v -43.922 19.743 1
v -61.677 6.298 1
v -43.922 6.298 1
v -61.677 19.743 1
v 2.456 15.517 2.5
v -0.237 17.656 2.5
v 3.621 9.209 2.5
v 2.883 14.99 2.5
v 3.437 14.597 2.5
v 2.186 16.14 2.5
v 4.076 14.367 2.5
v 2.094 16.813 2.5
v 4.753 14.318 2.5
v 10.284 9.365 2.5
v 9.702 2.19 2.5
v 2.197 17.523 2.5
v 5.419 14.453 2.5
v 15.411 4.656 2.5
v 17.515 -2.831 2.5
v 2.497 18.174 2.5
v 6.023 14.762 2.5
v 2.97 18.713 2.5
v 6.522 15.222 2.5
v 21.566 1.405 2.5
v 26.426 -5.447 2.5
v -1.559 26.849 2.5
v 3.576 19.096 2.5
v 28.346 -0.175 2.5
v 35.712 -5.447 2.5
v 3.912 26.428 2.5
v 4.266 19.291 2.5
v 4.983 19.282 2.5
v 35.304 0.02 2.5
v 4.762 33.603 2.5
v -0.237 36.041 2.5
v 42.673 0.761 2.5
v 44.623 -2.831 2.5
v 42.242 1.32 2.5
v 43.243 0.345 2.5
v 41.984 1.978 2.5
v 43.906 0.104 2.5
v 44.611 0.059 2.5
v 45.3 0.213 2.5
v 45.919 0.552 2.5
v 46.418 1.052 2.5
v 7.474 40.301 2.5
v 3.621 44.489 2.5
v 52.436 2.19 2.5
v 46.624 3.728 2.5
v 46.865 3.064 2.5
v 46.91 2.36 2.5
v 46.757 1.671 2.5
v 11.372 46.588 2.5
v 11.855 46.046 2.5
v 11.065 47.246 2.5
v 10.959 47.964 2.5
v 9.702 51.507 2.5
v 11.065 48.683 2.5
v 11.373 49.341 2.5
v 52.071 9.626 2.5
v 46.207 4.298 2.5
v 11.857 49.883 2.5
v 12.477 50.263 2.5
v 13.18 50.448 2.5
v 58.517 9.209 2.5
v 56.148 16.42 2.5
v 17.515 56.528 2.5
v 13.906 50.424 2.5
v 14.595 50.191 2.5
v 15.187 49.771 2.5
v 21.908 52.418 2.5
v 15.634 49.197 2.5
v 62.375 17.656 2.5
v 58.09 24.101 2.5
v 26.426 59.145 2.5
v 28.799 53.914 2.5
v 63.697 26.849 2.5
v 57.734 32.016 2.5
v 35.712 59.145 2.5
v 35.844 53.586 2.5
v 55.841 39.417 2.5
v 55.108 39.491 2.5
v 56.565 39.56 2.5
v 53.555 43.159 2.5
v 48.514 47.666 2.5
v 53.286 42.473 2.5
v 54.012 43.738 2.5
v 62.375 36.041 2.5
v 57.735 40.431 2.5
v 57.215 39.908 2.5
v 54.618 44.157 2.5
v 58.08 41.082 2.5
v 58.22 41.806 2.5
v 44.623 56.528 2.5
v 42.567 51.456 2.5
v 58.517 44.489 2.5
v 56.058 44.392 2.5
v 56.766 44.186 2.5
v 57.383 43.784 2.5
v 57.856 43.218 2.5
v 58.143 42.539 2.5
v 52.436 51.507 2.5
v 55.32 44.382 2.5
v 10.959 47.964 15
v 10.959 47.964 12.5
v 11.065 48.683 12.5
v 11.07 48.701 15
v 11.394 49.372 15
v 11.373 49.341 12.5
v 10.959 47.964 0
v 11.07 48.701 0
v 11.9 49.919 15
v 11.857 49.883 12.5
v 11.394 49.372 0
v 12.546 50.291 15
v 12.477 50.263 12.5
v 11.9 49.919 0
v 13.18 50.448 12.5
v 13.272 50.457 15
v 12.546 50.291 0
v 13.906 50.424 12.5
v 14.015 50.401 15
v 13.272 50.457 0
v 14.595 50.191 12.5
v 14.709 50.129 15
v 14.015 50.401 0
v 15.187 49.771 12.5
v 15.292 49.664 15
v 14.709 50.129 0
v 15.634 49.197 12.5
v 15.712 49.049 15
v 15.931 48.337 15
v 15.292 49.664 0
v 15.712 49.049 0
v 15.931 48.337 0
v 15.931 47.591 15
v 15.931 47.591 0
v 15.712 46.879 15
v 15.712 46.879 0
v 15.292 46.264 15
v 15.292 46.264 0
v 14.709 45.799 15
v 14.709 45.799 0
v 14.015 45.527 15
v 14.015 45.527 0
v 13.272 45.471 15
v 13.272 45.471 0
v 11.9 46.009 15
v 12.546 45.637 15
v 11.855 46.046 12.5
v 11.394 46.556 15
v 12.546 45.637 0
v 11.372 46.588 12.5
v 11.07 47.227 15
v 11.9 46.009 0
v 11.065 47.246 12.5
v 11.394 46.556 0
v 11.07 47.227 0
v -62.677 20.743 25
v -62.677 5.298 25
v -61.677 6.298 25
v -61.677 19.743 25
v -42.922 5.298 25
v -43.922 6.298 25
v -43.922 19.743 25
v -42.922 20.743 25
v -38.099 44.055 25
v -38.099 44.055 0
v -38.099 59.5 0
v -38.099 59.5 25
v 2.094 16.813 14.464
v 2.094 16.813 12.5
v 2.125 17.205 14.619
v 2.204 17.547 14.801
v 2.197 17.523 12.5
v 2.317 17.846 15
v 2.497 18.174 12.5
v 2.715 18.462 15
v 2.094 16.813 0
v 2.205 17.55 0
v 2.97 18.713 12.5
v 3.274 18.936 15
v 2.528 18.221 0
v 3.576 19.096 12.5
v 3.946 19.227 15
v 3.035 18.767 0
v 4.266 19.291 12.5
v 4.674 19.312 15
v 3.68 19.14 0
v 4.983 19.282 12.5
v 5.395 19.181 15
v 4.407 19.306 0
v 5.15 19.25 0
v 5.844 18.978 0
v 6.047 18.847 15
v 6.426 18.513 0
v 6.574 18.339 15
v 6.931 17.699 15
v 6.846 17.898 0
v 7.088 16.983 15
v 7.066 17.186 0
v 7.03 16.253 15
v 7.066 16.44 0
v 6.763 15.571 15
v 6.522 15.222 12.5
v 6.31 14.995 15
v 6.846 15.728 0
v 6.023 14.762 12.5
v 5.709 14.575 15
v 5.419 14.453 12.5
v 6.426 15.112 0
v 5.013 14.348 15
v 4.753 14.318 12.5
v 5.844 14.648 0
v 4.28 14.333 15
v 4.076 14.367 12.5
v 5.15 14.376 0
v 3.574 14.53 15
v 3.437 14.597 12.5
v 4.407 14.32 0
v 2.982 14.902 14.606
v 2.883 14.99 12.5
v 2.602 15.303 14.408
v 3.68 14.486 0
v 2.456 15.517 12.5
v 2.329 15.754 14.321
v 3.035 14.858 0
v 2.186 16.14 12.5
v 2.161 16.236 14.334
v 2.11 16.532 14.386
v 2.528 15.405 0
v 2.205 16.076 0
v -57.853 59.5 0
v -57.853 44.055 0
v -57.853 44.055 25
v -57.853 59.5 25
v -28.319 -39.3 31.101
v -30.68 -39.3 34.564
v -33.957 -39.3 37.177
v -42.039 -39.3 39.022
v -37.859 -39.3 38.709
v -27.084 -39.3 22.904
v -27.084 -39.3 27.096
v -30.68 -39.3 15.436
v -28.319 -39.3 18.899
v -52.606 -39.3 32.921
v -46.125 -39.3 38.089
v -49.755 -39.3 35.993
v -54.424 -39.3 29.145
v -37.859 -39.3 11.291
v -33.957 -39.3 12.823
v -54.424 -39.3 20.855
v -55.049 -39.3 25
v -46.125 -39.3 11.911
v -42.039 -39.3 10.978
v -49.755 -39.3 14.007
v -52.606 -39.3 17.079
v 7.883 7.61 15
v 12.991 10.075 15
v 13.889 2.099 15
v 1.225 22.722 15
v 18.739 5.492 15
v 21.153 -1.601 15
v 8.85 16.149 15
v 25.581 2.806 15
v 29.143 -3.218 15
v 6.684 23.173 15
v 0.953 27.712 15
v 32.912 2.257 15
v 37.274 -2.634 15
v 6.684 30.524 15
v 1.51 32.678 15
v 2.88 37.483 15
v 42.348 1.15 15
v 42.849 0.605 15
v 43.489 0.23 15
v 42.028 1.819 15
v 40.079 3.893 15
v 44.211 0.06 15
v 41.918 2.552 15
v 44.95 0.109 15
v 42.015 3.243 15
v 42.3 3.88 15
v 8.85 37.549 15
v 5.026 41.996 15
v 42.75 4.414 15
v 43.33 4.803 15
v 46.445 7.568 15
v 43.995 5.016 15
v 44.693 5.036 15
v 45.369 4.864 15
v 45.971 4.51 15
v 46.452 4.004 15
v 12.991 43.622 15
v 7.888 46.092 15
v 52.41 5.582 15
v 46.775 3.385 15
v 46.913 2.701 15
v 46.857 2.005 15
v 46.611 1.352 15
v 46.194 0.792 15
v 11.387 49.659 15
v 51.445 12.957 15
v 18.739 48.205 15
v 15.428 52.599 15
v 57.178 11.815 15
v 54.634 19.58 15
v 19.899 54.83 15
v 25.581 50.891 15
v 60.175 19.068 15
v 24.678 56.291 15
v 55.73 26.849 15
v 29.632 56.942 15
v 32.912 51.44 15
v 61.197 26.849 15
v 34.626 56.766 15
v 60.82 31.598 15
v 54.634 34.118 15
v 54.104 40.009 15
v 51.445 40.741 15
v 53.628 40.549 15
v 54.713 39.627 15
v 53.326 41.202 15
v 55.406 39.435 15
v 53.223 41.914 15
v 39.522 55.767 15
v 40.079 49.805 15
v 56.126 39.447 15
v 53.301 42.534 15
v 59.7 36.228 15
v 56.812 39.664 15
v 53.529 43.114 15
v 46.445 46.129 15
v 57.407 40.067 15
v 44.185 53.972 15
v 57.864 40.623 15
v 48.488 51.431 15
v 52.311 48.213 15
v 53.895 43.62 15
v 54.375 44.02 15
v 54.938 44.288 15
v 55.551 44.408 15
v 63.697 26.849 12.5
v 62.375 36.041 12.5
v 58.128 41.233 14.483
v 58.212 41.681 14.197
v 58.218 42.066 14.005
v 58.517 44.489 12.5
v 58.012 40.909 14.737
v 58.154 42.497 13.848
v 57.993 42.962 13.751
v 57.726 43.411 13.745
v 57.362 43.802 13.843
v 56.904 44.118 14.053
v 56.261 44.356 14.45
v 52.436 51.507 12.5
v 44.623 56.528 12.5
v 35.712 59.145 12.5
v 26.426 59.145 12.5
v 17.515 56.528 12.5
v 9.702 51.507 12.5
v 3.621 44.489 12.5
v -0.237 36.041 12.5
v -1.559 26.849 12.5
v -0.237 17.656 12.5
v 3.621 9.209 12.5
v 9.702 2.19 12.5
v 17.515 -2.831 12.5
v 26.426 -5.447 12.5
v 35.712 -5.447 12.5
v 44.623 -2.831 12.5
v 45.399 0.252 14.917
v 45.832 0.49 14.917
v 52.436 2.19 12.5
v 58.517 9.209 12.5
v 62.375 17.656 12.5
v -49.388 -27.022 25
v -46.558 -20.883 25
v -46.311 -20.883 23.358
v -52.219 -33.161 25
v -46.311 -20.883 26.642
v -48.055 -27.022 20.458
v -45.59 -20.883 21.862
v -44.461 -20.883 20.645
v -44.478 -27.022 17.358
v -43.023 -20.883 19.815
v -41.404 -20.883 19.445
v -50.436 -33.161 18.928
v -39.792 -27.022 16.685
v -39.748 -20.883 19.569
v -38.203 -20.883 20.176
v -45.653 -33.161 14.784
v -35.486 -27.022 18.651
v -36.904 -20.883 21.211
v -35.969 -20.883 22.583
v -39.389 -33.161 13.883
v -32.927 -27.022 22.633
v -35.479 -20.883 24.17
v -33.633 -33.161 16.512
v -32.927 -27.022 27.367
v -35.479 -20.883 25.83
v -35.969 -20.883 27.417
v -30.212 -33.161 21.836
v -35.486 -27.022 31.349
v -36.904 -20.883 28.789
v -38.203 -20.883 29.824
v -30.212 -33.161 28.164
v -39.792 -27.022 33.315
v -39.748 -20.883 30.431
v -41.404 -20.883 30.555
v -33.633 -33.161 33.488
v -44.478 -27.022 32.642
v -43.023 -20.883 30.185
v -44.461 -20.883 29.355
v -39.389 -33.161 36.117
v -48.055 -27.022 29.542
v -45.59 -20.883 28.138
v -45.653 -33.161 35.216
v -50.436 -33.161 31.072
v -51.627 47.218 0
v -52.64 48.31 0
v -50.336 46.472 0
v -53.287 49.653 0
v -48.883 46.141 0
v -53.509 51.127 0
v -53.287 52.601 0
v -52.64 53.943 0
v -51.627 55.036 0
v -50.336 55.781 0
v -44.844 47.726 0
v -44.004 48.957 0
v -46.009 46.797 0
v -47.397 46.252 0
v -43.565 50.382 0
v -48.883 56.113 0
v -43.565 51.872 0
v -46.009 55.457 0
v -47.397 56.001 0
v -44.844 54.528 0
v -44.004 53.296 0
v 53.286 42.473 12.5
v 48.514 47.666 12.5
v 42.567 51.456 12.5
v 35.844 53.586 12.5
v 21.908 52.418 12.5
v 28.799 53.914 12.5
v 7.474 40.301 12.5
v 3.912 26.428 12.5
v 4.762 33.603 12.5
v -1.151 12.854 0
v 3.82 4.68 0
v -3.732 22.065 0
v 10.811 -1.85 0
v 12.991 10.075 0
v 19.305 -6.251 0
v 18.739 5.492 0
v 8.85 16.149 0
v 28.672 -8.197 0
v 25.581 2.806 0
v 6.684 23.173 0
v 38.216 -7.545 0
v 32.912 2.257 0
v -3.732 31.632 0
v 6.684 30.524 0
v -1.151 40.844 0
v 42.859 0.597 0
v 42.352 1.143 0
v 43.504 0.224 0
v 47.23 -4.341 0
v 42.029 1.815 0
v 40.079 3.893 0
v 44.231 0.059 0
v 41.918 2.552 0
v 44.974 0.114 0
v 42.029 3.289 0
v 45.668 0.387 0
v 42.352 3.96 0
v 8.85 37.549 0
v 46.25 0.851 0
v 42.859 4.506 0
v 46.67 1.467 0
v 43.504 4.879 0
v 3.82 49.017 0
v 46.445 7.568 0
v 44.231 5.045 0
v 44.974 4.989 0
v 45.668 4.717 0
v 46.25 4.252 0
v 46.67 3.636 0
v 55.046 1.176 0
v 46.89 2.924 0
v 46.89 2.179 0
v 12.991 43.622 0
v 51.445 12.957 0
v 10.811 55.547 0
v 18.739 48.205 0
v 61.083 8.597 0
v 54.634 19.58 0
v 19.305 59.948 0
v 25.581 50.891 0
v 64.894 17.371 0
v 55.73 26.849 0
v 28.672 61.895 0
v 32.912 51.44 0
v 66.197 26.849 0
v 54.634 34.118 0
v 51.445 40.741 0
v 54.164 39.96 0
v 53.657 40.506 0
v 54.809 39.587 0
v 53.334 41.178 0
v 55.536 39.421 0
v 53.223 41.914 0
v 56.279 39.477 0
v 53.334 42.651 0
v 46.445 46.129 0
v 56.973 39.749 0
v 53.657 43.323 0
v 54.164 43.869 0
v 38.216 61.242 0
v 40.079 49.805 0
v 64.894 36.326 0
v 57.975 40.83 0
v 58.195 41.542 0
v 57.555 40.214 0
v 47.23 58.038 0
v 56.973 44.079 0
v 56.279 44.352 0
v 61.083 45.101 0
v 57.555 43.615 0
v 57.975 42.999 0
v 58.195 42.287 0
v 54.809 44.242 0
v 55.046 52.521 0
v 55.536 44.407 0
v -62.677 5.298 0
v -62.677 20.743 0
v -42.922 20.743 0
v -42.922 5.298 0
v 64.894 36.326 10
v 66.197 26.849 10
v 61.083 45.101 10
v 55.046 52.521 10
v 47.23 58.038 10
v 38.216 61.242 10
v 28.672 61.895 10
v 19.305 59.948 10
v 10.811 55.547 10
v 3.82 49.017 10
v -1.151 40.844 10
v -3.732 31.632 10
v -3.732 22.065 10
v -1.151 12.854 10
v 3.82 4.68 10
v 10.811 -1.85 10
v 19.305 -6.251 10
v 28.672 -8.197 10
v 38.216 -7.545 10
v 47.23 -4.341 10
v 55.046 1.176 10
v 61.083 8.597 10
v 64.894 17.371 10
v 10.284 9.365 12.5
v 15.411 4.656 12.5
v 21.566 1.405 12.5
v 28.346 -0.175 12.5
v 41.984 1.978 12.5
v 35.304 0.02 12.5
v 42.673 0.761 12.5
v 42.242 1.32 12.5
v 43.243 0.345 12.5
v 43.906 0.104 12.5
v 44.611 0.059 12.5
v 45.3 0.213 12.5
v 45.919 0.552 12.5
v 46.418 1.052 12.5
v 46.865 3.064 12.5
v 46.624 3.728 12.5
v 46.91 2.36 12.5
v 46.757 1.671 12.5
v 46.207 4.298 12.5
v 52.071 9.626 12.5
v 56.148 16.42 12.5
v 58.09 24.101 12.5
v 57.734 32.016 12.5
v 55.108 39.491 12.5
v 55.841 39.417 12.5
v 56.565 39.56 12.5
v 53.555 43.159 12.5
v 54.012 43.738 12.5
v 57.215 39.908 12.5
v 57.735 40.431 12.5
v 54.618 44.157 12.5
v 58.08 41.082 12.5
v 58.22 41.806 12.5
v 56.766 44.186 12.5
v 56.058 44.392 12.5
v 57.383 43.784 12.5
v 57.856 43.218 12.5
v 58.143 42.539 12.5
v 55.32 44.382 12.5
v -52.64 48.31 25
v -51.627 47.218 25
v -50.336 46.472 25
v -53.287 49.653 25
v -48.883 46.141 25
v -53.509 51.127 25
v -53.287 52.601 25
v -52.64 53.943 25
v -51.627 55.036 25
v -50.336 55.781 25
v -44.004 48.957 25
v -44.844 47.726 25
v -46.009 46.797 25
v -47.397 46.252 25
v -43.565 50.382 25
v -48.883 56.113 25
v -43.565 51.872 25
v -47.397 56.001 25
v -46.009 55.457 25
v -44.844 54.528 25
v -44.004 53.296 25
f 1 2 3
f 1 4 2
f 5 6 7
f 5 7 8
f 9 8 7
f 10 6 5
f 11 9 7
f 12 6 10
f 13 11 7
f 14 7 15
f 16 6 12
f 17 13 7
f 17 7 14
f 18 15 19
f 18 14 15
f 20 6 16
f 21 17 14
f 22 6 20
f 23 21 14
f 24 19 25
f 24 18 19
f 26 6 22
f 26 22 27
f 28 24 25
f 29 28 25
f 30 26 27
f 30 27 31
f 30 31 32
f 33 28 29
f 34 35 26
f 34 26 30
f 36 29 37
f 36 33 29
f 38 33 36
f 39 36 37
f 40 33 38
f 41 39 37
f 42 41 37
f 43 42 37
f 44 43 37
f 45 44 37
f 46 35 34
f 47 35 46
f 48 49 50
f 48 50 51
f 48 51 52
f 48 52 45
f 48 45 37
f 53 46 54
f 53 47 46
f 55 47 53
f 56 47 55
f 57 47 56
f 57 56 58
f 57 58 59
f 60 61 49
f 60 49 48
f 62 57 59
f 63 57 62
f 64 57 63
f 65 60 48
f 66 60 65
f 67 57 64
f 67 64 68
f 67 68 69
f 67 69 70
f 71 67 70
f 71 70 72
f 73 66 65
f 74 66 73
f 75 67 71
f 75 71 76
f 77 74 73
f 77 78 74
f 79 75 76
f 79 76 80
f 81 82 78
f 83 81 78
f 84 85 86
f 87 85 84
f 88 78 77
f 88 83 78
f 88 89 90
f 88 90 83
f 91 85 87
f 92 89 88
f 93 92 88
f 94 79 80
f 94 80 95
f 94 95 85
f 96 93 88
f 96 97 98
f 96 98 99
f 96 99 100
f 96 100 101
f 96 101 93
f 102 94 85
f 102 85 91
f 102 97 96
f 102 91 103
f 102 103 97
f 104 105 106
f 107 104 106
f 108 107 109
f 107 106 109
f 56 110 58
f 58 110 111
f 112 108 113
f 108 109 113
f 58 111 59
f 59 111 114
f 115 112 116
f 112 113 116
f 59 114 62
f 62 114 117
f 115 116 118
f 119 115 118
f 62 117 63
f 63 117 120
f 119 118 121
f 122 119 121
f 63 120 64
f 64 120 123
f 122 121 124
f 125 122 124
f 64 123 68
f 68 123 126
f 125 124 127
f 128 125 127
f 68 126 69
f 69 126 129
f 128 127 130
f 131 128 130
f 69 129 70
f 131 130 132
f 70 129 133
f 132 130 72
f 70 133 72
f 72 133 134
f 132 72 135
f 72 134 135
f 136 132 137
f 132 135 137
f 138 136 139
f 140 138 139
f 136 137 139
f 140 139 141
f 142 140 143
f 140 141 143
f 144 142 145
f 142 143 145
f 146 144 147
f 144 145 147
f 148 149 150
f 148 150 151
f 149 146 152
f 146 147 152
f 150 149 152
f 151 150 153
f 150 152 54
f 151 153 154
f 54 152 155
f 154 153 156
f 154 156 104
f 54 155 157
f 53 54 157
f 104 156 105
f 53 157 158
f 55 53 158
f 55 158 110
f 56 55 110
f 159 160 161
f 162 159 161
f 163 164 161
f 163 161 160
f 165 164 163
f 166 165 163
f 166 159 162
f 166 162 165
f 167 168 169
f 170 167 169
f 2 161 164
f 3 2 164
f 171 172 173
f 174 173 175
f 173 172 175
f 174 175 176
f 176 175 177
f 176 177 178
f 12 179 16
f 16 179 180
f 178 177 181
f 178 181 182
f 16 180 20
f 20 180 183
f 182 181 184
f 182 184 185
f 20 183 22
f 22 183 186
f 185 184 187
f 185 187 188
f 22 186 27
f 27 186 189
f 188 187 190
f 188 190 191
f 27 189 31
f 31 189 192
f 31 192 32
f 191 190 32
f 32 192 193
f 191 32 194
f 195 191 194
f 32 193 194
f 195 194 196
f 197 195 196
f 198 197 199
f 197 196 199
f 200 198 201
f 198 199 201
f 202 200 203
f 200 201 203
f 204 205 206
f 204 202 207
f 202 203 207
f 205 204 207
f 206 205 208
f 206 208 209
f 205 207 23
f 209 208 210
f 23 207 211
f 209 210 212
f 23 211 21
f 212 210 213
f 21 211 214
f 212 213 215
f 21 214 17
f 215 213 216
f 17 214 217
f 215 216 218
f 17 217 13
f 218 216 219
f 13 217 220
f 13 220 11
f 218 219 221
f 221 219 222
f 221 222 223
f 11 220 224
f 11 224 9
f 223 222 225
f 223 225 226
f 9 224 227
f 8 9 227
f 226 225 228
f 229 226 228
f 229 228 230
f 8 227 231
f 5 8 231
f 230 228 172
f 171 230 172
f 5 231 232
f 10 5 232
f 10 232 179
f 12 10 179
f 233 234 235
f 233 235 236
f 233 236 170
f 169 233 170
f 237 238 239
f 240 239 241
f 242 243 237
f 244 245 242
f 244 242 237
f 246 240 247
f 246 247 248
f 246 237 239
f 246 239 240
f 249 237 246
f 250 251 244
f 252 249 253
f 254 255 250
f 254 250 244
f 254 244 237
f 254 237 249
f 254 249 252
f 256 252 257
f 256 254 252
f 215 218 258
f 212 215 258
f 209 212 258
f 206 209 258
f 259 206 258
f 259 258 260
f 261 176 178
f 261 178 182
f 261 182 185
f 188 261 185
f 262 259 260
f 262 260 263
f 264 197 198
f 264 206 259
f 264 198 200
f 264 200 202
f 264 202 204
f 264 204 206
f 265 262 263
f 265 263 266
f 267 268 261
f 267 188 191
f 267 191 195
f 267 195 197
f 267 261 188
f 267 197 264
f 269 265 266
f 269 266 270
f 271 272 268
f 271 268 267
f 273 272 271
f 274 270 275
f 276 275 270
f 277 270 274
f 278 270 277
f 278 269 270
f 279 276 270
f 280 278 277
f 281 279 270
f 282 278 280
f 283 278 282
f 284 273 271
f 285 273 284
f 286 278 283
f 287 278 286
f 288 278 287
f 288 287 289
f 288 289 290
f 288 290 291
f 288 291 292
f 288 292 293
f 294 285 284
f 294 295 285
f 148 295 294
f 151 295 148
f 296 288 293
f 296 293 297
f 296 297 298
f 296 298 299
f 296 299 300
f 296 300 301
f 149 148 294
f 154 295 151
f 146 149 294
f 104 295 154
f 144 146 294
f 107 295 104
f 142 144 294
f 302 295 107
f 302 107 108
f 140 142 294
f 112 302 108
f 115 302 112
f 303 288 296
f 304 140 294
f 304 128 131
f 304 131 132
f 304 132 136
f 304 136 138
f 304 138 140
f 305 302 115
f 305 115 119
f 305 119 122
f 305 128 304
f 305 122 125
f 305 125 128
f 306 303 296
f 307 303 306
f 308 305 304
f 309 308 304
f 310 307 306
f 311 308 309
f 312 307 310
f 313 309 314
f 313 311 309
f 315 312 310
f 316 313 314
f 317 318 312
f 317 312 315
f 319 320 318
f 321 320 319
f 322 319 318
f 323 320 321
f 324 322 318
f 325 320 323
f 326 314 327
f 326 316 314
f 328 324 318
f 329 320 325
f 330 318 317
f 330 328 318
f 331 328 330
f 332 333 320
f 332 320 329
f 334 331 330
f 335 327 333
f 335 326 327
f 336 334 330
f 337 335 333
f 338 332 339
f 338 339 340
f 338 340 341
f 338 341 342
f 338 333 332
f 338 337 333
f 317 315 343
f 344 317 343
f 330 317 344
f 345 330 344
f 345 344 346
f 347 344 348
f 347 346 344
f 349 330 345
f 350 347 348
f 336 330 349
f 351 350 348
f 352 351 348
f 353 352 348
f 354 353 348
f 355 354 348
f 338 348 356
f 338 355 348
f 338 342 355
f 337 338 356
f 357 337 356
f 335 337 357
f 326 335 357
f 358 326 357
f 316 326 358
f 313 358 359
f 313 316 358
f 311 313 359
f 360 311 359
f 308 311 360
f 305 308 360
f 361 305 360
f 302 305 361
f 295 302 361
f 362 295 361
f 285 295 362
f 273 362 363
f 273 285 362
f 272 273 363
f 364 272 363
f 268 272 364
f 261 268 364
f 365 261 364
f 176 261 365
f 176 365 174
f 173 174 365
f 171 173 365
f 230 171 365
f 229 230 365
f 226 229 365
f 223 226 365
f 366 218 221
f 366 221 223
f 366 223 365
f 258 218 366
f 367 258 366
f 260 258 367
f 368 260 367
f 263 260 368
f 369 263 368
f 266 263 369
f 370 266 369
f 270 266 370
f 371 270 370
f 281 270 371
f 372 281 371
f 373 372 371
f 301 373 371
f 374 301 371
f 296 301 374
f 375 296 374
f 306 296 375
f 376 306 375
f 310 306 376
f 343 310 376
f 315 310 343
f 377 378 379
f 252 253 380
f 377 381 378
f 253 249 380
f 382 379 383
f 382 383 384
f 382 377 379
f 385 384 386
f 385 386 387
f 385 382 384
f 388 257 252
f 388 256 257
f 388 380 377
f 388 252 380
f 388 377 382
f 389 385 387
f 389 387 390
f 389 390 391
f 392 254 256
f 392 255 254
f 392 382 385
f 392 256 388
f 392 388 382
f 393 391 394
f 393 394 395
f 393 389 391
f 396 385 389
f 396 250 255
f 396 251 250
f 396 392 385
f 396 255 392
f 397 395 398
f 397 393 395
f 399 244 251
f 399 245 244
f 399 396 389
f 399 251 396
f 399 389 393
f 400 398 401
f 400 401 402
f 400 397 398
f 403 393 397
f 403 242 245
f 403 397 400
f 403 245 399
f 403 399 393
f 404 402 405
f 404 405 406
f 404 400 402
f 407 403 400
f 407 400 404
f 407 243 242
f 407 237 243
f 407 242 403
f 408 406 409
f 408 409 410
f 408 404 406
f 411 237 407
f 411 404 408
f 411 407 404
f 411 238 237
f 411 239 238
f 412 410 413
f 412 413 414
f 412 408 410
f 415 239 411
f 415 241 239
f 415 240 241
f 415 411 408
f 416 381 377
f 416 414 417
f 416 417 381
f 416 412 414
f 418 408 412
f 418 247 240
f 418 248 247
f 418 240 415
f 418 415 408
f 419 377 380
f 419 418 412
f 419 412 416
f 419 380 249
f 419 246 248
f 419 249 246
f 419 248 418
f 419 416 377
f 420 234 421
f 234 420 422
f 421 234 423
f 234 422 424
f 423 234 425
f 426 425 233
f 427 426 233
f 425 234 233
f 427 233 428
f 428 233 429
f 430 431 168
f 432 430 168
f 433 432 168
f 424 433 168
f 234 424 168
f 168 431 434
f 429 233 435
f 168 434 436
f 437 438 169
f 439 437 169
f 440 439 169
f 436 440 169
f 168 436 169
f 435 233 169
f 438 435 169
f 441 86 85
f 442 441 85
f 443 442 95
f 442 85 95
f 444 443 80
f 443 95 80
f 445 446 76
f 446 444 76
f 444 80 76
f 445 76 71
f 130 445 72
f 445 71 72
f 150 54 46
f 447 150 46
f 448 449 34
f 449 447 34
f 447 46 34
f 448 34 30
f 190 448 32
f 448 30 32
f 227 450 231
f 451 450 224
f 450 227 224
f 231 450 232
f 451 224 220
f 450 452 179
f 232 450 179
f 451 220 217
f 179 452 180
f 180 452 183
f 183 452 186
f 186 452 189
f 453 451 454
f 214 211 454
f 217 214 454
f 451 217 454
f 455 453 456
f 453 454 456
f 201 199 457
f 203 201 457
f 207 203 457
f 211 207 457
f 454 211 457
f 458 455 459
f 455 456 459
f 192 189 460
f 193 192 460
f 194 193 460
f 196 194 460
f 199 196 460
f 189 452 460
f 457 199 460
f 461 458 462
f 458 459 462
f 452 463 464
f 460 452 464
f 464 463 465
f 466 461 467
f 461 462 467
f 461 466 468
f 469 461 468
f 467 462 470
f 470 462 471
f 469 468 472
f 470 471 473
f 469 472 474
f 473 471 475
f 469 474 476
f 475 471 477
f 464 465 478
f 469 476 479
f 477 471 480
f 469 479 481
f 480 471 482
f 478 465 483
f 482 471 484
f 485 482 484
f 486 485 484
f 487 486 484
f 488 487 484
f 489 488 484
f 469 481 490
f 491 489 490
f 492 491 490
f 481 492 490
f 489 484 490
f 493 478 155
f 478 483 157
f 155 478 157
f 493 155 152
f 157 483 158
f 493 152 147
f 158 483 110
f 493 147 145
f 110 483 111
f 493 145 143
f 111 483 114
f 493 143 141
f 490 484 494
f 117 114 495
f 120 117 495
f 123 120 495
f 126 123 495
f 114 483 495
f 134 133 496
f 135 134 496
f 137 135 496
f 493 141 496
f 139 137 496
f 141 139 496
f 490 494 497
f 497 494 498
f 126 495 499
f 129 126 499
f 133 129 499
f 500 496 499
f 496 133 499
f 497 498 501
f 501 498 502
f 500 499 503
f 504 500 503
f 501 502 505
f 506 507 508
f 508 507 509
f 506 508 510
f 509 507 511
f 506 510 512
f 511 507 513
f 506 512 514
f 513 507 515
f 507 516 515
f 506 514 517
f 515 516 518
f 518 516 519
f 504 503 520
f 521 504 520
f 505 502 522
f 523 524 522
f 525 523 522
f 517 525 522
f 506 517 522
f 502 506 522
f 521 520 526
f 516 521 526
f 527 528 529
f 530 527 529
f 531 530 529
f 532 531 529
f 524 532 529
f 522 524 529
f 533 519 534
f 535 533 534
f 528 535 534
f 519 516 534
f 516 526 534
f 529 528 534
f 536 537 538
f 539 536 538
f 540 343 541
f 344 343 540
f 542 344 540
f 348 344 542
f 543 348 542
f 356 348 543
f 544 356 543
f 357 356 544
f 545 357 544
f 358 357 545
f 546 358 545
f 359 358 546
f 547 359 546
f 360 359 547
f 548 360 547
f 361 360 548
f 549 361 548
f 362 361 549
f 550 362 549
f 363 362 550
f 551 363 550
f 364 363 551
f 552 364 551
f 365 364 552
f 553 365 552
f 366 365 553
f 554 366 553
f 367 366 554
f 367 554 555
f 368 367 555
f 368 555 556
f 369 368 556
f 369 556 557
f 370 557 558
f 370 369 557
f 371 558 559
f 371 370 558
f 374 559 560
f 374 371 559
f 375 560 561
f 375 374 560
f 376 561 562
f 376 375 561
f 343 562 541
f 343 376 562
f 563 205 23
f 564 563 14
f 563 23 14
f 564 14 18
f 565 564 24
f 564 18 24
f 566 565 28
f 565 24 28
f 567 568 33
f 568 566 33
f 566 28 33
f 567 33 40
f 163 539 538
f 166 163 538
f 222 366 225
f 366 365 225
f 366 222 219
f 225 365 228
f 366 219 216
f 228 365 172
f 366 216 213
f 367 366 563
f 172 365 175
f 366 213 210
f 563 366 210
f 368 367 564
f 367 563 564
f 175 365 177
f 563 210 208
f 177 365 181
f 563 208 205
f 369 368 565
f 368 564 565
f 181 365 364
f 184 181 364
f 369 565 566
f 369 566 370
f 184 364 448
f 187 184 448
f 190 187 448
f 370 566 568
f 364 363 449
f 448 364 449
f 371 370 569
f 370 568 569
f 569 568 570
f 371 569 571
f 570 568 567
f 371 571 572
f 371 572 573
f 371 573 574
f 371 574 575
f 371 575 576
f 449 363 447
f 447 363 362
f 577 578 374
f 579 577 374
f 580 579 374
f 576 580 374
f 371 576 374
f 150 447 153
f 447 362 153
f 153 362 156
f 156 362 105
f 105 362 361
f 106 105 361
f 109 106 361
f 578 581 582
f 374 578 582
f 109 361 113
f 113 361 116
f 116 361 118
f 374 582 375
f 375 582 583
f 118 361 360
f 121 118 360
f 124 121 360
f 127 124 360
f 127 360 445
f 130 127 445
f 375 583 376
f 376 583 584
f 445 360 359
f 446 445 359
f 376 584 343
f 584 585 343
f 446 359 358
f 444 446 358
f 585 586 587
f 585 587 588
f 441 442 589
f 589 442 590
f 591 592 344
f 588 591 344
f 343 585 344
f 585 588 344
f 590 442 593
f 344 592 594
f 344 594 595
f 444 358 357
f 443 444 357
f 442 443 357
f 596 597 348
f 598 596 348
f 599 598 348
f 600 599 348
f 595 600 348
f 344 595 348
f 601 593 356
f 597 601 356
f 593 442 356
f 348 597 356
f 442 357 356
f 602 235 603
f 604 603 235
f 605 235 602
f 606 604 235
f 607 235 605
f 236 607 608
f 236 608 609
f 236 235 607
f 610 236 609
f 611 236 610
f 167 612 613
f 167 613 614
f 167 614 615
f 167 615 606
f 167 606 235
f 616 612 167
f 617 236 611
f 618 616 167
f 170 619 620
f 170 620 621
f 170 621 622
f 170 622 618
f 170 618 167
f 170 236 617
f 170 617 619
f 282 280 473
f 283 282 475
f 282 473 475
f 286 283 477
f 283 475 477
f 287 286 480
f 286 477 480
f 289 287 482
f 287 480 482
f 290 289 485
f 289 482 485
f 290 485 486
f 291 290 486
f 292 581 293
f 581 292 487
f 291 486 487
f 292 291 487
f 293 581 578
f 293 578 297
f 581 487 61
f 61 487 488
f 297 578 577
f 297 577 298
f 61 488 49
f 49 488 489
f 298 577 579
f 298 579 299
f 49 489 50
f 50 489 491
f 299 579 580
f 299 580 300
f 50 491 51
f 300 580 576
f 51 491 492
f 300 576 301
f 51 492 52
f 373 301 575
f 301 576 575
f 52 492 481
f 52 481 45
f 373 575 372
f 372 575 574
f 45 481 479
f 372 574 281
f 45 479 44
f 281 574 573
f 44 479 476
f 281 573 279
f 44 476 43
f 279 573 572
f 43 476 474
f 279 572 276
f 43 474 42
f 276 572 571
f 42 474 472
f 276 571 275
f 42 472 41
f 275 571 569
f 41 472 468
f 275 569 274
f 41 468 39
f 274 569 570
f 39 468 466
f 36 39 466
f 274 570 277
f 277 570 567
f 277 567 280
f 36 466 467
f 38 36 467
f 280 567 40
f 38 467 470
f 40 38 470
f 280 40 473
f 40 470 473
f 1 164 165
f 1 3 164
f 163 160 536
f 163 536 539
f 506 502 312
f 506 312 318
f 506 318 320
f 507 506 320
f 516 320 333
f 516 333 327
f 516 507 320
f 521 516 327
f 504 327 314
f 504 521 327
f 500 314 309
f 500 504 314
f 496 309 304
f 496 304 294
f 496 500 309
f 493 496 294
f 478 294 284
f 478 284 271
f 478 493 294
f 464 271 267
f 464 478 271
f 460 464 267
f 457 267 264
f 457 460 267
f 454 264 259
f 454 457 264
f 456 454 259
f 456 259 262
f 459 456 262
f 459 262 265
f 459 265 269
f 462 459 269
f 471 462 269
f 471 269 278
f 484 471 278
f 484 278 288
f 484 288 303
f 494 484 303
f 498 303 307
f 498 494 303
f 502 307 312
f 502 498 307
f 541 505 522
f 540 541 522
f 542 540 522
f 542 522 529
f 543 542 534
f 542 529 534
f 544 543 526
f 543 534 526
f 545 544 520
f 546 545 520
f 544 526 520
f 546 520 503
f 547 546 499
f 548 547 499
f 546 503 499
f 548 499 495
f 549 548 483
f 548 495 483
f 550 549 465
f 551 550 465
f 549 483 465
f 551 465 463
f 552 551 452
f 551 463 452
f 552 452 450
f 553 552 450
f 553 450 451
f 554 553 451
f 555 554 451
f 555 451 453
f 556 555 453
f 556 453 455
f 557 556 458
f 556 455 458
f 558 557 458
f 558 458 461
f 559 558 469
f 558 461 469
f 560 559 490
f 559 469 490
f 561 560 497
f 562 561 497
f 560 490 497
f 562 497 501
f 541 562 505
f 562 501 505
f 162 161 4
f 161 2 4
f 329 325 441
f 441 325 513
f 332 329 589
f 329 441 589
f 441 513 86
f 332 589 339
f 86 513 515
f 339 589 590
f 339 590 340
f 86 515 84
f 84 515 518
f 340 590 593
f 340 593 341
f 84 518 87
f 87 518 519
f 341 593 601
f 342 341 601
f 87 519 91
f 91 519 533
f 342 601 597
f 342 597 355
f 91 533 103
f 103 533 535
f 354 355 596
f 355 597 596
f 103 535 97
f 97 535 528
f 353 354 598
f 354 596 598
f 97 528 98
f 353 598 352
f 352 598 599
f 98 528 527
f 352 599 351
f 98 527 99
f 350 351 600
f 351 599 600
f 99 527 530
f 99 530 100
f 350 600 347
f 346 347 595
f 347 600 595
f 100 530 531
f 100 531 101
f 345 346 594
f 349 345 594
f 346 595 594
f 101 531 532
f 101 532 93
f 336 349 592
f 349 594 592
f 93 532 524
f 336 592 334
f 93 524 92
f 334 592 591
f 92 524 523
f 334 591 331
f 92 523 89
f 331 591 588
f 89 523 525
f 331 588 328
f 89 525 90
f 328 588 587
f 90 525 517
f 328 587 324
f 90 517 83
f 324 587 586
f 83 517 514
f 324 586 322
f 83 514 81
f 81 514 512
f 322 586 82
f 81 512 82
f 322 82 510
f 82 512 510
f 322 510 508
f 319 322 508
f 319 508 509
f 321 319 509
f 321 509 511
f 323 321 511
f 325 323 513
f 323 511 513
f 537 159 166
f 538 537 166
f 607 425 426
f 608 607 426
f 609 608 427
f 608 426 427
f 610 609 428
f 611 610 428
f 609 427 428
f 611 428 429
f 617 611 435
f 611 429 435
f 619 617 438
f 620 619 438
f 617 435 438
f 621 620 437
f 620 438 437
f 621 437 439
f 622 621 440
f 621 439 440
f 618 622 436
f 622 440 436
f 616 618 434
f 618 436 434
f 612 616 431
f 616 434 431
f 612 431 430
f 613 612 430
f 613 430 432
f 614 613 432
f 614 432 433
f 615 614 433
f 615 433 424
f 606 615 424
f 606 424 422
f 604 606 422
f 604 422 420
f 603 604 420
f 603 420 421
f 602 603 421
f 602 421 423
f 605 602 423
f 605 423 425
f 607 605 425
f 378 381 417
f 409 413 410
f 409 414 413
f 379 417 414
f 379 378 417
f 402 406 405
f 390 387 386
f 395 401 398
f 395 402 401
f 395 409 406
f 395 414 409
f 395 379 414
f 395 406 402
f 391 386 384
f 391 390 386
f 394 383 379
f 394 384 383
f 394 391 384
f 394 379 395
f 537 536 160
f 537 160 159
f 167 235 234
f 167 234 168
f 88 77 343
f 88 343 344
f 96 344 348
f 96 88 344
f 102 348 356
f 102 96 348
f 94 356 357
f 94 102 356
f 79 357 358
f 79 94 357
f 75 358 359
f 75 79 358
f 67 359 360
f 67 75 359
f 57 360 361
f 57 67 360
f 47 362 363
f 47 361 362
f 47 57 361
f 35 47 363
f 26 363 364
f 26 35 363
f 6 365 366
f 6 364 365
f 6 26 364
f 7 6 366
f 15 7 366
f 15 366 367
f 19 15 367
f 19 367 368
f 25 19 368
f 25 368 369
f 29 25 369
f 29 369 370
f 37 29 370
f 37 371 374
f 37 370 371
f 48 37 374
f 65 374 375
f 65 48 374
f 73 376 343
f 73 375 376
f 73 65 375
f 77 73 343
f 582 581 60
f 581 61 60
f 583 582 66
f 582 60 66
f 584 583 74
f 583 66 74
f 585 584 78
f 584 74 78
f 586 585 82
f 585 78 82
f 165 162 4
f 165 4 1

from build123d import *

# Parameters (mm, degrees)
F0_R     = 35.1280043559
F0_R_2   = 24.660722934
F1_DEPTH = 15
F2_SIZE  = 5
F3_T     = -2.5
F0_W     = 19.7548493743
F0_H     = 15.4446987435
F4_DEPTH = 25
F5_T     = -1
F7_D     = 10
F9_D     = 5


with BuildPart() as f1:
    # F0 (on Top) → F1 (new body)
    with BuildSketch(Plane.XY):
        with Locations((31.0689881444, 26.8486309797)):
            Circle(F0_R)
        with Locations((31.0689881444, 26.8486309797)):
            Circle(F0_R_2, mode=Mode.SUBTRACT)
    extrude(amount=F1_DEPTH)

    # F2
    f2_edges = [f1.edges().sort_by_distance(p)[0] for p in [
        (-4.059016, 26.848631, 15),
    ]]
    chamfer(f2_edges, length=F2_SIZE)

    # F3
    f3_openings = [f1.faces().sort_by_distance(p)[0] for p in [
        (-1.559016, 26.848631, 12.5),
    ]]
    offset(amount=F3_T, openings=f3_openings)

    # F9 (through all)
    with Locations(Plane.XY.offset(15)):
        with Locations((55.7226426899, 41.914395988), (13.4591273963, 47.9640252888), (4.5937690884, 16.8129019439), (44.4176457822, 2.5516494643)):
            Hole(F9_D / 2)


with BuildPart() as f4:
    # F0 (on Top) → F4 (new body)
    with BuildSketch(Plane.XY):
        with Locations((-52.7993179858, 13.0202402361)):
            Rectangle(F0_W, F0_H)
    extrude(amount=F4_DEPTH)

    # F5
    f5_openings = [f4.faces().sort_by_distance(p)[0] for p in [
        (-52.799318, 13.02024, 25),
    ]]
    offset(amount=F5_T, openings=f5_openings)


with BuildPart() as f4b:
    # F0 (on Top) → F4, piece 2 (new body)
    with BuildSketch(Plane.XY):
        with Locations((-47.9759350419, 51.7777875066)):
            Rectangle(F0_W, F0_H)
    extrude(amount=F4_DEPTH)

    # F7 (through all)
    with Locations(Plane.XY.offset(25)):
        with Locations((-48.509132117, 51.1267594993)):
            Hole(F7_D / 2)


with BuildPart() as f10:
    # F6 (on face) → F10 (revolve)
    with BuildSketch(Plane.XY.offset(25)):
        Polygon((-40.9877710044, -20.8830051124), (-46.5582609177, -20.8830051124), (-55.048879236, -39.3000245094), (-40.9877710044, -39.3000245094), align=None)
    revolve(axis=Axis((-40.9877710044, -30.0915148109, 25), (0, -1, 0)))


solid = Compound([f1.part, f4.part, f4b.part, f10.part])
